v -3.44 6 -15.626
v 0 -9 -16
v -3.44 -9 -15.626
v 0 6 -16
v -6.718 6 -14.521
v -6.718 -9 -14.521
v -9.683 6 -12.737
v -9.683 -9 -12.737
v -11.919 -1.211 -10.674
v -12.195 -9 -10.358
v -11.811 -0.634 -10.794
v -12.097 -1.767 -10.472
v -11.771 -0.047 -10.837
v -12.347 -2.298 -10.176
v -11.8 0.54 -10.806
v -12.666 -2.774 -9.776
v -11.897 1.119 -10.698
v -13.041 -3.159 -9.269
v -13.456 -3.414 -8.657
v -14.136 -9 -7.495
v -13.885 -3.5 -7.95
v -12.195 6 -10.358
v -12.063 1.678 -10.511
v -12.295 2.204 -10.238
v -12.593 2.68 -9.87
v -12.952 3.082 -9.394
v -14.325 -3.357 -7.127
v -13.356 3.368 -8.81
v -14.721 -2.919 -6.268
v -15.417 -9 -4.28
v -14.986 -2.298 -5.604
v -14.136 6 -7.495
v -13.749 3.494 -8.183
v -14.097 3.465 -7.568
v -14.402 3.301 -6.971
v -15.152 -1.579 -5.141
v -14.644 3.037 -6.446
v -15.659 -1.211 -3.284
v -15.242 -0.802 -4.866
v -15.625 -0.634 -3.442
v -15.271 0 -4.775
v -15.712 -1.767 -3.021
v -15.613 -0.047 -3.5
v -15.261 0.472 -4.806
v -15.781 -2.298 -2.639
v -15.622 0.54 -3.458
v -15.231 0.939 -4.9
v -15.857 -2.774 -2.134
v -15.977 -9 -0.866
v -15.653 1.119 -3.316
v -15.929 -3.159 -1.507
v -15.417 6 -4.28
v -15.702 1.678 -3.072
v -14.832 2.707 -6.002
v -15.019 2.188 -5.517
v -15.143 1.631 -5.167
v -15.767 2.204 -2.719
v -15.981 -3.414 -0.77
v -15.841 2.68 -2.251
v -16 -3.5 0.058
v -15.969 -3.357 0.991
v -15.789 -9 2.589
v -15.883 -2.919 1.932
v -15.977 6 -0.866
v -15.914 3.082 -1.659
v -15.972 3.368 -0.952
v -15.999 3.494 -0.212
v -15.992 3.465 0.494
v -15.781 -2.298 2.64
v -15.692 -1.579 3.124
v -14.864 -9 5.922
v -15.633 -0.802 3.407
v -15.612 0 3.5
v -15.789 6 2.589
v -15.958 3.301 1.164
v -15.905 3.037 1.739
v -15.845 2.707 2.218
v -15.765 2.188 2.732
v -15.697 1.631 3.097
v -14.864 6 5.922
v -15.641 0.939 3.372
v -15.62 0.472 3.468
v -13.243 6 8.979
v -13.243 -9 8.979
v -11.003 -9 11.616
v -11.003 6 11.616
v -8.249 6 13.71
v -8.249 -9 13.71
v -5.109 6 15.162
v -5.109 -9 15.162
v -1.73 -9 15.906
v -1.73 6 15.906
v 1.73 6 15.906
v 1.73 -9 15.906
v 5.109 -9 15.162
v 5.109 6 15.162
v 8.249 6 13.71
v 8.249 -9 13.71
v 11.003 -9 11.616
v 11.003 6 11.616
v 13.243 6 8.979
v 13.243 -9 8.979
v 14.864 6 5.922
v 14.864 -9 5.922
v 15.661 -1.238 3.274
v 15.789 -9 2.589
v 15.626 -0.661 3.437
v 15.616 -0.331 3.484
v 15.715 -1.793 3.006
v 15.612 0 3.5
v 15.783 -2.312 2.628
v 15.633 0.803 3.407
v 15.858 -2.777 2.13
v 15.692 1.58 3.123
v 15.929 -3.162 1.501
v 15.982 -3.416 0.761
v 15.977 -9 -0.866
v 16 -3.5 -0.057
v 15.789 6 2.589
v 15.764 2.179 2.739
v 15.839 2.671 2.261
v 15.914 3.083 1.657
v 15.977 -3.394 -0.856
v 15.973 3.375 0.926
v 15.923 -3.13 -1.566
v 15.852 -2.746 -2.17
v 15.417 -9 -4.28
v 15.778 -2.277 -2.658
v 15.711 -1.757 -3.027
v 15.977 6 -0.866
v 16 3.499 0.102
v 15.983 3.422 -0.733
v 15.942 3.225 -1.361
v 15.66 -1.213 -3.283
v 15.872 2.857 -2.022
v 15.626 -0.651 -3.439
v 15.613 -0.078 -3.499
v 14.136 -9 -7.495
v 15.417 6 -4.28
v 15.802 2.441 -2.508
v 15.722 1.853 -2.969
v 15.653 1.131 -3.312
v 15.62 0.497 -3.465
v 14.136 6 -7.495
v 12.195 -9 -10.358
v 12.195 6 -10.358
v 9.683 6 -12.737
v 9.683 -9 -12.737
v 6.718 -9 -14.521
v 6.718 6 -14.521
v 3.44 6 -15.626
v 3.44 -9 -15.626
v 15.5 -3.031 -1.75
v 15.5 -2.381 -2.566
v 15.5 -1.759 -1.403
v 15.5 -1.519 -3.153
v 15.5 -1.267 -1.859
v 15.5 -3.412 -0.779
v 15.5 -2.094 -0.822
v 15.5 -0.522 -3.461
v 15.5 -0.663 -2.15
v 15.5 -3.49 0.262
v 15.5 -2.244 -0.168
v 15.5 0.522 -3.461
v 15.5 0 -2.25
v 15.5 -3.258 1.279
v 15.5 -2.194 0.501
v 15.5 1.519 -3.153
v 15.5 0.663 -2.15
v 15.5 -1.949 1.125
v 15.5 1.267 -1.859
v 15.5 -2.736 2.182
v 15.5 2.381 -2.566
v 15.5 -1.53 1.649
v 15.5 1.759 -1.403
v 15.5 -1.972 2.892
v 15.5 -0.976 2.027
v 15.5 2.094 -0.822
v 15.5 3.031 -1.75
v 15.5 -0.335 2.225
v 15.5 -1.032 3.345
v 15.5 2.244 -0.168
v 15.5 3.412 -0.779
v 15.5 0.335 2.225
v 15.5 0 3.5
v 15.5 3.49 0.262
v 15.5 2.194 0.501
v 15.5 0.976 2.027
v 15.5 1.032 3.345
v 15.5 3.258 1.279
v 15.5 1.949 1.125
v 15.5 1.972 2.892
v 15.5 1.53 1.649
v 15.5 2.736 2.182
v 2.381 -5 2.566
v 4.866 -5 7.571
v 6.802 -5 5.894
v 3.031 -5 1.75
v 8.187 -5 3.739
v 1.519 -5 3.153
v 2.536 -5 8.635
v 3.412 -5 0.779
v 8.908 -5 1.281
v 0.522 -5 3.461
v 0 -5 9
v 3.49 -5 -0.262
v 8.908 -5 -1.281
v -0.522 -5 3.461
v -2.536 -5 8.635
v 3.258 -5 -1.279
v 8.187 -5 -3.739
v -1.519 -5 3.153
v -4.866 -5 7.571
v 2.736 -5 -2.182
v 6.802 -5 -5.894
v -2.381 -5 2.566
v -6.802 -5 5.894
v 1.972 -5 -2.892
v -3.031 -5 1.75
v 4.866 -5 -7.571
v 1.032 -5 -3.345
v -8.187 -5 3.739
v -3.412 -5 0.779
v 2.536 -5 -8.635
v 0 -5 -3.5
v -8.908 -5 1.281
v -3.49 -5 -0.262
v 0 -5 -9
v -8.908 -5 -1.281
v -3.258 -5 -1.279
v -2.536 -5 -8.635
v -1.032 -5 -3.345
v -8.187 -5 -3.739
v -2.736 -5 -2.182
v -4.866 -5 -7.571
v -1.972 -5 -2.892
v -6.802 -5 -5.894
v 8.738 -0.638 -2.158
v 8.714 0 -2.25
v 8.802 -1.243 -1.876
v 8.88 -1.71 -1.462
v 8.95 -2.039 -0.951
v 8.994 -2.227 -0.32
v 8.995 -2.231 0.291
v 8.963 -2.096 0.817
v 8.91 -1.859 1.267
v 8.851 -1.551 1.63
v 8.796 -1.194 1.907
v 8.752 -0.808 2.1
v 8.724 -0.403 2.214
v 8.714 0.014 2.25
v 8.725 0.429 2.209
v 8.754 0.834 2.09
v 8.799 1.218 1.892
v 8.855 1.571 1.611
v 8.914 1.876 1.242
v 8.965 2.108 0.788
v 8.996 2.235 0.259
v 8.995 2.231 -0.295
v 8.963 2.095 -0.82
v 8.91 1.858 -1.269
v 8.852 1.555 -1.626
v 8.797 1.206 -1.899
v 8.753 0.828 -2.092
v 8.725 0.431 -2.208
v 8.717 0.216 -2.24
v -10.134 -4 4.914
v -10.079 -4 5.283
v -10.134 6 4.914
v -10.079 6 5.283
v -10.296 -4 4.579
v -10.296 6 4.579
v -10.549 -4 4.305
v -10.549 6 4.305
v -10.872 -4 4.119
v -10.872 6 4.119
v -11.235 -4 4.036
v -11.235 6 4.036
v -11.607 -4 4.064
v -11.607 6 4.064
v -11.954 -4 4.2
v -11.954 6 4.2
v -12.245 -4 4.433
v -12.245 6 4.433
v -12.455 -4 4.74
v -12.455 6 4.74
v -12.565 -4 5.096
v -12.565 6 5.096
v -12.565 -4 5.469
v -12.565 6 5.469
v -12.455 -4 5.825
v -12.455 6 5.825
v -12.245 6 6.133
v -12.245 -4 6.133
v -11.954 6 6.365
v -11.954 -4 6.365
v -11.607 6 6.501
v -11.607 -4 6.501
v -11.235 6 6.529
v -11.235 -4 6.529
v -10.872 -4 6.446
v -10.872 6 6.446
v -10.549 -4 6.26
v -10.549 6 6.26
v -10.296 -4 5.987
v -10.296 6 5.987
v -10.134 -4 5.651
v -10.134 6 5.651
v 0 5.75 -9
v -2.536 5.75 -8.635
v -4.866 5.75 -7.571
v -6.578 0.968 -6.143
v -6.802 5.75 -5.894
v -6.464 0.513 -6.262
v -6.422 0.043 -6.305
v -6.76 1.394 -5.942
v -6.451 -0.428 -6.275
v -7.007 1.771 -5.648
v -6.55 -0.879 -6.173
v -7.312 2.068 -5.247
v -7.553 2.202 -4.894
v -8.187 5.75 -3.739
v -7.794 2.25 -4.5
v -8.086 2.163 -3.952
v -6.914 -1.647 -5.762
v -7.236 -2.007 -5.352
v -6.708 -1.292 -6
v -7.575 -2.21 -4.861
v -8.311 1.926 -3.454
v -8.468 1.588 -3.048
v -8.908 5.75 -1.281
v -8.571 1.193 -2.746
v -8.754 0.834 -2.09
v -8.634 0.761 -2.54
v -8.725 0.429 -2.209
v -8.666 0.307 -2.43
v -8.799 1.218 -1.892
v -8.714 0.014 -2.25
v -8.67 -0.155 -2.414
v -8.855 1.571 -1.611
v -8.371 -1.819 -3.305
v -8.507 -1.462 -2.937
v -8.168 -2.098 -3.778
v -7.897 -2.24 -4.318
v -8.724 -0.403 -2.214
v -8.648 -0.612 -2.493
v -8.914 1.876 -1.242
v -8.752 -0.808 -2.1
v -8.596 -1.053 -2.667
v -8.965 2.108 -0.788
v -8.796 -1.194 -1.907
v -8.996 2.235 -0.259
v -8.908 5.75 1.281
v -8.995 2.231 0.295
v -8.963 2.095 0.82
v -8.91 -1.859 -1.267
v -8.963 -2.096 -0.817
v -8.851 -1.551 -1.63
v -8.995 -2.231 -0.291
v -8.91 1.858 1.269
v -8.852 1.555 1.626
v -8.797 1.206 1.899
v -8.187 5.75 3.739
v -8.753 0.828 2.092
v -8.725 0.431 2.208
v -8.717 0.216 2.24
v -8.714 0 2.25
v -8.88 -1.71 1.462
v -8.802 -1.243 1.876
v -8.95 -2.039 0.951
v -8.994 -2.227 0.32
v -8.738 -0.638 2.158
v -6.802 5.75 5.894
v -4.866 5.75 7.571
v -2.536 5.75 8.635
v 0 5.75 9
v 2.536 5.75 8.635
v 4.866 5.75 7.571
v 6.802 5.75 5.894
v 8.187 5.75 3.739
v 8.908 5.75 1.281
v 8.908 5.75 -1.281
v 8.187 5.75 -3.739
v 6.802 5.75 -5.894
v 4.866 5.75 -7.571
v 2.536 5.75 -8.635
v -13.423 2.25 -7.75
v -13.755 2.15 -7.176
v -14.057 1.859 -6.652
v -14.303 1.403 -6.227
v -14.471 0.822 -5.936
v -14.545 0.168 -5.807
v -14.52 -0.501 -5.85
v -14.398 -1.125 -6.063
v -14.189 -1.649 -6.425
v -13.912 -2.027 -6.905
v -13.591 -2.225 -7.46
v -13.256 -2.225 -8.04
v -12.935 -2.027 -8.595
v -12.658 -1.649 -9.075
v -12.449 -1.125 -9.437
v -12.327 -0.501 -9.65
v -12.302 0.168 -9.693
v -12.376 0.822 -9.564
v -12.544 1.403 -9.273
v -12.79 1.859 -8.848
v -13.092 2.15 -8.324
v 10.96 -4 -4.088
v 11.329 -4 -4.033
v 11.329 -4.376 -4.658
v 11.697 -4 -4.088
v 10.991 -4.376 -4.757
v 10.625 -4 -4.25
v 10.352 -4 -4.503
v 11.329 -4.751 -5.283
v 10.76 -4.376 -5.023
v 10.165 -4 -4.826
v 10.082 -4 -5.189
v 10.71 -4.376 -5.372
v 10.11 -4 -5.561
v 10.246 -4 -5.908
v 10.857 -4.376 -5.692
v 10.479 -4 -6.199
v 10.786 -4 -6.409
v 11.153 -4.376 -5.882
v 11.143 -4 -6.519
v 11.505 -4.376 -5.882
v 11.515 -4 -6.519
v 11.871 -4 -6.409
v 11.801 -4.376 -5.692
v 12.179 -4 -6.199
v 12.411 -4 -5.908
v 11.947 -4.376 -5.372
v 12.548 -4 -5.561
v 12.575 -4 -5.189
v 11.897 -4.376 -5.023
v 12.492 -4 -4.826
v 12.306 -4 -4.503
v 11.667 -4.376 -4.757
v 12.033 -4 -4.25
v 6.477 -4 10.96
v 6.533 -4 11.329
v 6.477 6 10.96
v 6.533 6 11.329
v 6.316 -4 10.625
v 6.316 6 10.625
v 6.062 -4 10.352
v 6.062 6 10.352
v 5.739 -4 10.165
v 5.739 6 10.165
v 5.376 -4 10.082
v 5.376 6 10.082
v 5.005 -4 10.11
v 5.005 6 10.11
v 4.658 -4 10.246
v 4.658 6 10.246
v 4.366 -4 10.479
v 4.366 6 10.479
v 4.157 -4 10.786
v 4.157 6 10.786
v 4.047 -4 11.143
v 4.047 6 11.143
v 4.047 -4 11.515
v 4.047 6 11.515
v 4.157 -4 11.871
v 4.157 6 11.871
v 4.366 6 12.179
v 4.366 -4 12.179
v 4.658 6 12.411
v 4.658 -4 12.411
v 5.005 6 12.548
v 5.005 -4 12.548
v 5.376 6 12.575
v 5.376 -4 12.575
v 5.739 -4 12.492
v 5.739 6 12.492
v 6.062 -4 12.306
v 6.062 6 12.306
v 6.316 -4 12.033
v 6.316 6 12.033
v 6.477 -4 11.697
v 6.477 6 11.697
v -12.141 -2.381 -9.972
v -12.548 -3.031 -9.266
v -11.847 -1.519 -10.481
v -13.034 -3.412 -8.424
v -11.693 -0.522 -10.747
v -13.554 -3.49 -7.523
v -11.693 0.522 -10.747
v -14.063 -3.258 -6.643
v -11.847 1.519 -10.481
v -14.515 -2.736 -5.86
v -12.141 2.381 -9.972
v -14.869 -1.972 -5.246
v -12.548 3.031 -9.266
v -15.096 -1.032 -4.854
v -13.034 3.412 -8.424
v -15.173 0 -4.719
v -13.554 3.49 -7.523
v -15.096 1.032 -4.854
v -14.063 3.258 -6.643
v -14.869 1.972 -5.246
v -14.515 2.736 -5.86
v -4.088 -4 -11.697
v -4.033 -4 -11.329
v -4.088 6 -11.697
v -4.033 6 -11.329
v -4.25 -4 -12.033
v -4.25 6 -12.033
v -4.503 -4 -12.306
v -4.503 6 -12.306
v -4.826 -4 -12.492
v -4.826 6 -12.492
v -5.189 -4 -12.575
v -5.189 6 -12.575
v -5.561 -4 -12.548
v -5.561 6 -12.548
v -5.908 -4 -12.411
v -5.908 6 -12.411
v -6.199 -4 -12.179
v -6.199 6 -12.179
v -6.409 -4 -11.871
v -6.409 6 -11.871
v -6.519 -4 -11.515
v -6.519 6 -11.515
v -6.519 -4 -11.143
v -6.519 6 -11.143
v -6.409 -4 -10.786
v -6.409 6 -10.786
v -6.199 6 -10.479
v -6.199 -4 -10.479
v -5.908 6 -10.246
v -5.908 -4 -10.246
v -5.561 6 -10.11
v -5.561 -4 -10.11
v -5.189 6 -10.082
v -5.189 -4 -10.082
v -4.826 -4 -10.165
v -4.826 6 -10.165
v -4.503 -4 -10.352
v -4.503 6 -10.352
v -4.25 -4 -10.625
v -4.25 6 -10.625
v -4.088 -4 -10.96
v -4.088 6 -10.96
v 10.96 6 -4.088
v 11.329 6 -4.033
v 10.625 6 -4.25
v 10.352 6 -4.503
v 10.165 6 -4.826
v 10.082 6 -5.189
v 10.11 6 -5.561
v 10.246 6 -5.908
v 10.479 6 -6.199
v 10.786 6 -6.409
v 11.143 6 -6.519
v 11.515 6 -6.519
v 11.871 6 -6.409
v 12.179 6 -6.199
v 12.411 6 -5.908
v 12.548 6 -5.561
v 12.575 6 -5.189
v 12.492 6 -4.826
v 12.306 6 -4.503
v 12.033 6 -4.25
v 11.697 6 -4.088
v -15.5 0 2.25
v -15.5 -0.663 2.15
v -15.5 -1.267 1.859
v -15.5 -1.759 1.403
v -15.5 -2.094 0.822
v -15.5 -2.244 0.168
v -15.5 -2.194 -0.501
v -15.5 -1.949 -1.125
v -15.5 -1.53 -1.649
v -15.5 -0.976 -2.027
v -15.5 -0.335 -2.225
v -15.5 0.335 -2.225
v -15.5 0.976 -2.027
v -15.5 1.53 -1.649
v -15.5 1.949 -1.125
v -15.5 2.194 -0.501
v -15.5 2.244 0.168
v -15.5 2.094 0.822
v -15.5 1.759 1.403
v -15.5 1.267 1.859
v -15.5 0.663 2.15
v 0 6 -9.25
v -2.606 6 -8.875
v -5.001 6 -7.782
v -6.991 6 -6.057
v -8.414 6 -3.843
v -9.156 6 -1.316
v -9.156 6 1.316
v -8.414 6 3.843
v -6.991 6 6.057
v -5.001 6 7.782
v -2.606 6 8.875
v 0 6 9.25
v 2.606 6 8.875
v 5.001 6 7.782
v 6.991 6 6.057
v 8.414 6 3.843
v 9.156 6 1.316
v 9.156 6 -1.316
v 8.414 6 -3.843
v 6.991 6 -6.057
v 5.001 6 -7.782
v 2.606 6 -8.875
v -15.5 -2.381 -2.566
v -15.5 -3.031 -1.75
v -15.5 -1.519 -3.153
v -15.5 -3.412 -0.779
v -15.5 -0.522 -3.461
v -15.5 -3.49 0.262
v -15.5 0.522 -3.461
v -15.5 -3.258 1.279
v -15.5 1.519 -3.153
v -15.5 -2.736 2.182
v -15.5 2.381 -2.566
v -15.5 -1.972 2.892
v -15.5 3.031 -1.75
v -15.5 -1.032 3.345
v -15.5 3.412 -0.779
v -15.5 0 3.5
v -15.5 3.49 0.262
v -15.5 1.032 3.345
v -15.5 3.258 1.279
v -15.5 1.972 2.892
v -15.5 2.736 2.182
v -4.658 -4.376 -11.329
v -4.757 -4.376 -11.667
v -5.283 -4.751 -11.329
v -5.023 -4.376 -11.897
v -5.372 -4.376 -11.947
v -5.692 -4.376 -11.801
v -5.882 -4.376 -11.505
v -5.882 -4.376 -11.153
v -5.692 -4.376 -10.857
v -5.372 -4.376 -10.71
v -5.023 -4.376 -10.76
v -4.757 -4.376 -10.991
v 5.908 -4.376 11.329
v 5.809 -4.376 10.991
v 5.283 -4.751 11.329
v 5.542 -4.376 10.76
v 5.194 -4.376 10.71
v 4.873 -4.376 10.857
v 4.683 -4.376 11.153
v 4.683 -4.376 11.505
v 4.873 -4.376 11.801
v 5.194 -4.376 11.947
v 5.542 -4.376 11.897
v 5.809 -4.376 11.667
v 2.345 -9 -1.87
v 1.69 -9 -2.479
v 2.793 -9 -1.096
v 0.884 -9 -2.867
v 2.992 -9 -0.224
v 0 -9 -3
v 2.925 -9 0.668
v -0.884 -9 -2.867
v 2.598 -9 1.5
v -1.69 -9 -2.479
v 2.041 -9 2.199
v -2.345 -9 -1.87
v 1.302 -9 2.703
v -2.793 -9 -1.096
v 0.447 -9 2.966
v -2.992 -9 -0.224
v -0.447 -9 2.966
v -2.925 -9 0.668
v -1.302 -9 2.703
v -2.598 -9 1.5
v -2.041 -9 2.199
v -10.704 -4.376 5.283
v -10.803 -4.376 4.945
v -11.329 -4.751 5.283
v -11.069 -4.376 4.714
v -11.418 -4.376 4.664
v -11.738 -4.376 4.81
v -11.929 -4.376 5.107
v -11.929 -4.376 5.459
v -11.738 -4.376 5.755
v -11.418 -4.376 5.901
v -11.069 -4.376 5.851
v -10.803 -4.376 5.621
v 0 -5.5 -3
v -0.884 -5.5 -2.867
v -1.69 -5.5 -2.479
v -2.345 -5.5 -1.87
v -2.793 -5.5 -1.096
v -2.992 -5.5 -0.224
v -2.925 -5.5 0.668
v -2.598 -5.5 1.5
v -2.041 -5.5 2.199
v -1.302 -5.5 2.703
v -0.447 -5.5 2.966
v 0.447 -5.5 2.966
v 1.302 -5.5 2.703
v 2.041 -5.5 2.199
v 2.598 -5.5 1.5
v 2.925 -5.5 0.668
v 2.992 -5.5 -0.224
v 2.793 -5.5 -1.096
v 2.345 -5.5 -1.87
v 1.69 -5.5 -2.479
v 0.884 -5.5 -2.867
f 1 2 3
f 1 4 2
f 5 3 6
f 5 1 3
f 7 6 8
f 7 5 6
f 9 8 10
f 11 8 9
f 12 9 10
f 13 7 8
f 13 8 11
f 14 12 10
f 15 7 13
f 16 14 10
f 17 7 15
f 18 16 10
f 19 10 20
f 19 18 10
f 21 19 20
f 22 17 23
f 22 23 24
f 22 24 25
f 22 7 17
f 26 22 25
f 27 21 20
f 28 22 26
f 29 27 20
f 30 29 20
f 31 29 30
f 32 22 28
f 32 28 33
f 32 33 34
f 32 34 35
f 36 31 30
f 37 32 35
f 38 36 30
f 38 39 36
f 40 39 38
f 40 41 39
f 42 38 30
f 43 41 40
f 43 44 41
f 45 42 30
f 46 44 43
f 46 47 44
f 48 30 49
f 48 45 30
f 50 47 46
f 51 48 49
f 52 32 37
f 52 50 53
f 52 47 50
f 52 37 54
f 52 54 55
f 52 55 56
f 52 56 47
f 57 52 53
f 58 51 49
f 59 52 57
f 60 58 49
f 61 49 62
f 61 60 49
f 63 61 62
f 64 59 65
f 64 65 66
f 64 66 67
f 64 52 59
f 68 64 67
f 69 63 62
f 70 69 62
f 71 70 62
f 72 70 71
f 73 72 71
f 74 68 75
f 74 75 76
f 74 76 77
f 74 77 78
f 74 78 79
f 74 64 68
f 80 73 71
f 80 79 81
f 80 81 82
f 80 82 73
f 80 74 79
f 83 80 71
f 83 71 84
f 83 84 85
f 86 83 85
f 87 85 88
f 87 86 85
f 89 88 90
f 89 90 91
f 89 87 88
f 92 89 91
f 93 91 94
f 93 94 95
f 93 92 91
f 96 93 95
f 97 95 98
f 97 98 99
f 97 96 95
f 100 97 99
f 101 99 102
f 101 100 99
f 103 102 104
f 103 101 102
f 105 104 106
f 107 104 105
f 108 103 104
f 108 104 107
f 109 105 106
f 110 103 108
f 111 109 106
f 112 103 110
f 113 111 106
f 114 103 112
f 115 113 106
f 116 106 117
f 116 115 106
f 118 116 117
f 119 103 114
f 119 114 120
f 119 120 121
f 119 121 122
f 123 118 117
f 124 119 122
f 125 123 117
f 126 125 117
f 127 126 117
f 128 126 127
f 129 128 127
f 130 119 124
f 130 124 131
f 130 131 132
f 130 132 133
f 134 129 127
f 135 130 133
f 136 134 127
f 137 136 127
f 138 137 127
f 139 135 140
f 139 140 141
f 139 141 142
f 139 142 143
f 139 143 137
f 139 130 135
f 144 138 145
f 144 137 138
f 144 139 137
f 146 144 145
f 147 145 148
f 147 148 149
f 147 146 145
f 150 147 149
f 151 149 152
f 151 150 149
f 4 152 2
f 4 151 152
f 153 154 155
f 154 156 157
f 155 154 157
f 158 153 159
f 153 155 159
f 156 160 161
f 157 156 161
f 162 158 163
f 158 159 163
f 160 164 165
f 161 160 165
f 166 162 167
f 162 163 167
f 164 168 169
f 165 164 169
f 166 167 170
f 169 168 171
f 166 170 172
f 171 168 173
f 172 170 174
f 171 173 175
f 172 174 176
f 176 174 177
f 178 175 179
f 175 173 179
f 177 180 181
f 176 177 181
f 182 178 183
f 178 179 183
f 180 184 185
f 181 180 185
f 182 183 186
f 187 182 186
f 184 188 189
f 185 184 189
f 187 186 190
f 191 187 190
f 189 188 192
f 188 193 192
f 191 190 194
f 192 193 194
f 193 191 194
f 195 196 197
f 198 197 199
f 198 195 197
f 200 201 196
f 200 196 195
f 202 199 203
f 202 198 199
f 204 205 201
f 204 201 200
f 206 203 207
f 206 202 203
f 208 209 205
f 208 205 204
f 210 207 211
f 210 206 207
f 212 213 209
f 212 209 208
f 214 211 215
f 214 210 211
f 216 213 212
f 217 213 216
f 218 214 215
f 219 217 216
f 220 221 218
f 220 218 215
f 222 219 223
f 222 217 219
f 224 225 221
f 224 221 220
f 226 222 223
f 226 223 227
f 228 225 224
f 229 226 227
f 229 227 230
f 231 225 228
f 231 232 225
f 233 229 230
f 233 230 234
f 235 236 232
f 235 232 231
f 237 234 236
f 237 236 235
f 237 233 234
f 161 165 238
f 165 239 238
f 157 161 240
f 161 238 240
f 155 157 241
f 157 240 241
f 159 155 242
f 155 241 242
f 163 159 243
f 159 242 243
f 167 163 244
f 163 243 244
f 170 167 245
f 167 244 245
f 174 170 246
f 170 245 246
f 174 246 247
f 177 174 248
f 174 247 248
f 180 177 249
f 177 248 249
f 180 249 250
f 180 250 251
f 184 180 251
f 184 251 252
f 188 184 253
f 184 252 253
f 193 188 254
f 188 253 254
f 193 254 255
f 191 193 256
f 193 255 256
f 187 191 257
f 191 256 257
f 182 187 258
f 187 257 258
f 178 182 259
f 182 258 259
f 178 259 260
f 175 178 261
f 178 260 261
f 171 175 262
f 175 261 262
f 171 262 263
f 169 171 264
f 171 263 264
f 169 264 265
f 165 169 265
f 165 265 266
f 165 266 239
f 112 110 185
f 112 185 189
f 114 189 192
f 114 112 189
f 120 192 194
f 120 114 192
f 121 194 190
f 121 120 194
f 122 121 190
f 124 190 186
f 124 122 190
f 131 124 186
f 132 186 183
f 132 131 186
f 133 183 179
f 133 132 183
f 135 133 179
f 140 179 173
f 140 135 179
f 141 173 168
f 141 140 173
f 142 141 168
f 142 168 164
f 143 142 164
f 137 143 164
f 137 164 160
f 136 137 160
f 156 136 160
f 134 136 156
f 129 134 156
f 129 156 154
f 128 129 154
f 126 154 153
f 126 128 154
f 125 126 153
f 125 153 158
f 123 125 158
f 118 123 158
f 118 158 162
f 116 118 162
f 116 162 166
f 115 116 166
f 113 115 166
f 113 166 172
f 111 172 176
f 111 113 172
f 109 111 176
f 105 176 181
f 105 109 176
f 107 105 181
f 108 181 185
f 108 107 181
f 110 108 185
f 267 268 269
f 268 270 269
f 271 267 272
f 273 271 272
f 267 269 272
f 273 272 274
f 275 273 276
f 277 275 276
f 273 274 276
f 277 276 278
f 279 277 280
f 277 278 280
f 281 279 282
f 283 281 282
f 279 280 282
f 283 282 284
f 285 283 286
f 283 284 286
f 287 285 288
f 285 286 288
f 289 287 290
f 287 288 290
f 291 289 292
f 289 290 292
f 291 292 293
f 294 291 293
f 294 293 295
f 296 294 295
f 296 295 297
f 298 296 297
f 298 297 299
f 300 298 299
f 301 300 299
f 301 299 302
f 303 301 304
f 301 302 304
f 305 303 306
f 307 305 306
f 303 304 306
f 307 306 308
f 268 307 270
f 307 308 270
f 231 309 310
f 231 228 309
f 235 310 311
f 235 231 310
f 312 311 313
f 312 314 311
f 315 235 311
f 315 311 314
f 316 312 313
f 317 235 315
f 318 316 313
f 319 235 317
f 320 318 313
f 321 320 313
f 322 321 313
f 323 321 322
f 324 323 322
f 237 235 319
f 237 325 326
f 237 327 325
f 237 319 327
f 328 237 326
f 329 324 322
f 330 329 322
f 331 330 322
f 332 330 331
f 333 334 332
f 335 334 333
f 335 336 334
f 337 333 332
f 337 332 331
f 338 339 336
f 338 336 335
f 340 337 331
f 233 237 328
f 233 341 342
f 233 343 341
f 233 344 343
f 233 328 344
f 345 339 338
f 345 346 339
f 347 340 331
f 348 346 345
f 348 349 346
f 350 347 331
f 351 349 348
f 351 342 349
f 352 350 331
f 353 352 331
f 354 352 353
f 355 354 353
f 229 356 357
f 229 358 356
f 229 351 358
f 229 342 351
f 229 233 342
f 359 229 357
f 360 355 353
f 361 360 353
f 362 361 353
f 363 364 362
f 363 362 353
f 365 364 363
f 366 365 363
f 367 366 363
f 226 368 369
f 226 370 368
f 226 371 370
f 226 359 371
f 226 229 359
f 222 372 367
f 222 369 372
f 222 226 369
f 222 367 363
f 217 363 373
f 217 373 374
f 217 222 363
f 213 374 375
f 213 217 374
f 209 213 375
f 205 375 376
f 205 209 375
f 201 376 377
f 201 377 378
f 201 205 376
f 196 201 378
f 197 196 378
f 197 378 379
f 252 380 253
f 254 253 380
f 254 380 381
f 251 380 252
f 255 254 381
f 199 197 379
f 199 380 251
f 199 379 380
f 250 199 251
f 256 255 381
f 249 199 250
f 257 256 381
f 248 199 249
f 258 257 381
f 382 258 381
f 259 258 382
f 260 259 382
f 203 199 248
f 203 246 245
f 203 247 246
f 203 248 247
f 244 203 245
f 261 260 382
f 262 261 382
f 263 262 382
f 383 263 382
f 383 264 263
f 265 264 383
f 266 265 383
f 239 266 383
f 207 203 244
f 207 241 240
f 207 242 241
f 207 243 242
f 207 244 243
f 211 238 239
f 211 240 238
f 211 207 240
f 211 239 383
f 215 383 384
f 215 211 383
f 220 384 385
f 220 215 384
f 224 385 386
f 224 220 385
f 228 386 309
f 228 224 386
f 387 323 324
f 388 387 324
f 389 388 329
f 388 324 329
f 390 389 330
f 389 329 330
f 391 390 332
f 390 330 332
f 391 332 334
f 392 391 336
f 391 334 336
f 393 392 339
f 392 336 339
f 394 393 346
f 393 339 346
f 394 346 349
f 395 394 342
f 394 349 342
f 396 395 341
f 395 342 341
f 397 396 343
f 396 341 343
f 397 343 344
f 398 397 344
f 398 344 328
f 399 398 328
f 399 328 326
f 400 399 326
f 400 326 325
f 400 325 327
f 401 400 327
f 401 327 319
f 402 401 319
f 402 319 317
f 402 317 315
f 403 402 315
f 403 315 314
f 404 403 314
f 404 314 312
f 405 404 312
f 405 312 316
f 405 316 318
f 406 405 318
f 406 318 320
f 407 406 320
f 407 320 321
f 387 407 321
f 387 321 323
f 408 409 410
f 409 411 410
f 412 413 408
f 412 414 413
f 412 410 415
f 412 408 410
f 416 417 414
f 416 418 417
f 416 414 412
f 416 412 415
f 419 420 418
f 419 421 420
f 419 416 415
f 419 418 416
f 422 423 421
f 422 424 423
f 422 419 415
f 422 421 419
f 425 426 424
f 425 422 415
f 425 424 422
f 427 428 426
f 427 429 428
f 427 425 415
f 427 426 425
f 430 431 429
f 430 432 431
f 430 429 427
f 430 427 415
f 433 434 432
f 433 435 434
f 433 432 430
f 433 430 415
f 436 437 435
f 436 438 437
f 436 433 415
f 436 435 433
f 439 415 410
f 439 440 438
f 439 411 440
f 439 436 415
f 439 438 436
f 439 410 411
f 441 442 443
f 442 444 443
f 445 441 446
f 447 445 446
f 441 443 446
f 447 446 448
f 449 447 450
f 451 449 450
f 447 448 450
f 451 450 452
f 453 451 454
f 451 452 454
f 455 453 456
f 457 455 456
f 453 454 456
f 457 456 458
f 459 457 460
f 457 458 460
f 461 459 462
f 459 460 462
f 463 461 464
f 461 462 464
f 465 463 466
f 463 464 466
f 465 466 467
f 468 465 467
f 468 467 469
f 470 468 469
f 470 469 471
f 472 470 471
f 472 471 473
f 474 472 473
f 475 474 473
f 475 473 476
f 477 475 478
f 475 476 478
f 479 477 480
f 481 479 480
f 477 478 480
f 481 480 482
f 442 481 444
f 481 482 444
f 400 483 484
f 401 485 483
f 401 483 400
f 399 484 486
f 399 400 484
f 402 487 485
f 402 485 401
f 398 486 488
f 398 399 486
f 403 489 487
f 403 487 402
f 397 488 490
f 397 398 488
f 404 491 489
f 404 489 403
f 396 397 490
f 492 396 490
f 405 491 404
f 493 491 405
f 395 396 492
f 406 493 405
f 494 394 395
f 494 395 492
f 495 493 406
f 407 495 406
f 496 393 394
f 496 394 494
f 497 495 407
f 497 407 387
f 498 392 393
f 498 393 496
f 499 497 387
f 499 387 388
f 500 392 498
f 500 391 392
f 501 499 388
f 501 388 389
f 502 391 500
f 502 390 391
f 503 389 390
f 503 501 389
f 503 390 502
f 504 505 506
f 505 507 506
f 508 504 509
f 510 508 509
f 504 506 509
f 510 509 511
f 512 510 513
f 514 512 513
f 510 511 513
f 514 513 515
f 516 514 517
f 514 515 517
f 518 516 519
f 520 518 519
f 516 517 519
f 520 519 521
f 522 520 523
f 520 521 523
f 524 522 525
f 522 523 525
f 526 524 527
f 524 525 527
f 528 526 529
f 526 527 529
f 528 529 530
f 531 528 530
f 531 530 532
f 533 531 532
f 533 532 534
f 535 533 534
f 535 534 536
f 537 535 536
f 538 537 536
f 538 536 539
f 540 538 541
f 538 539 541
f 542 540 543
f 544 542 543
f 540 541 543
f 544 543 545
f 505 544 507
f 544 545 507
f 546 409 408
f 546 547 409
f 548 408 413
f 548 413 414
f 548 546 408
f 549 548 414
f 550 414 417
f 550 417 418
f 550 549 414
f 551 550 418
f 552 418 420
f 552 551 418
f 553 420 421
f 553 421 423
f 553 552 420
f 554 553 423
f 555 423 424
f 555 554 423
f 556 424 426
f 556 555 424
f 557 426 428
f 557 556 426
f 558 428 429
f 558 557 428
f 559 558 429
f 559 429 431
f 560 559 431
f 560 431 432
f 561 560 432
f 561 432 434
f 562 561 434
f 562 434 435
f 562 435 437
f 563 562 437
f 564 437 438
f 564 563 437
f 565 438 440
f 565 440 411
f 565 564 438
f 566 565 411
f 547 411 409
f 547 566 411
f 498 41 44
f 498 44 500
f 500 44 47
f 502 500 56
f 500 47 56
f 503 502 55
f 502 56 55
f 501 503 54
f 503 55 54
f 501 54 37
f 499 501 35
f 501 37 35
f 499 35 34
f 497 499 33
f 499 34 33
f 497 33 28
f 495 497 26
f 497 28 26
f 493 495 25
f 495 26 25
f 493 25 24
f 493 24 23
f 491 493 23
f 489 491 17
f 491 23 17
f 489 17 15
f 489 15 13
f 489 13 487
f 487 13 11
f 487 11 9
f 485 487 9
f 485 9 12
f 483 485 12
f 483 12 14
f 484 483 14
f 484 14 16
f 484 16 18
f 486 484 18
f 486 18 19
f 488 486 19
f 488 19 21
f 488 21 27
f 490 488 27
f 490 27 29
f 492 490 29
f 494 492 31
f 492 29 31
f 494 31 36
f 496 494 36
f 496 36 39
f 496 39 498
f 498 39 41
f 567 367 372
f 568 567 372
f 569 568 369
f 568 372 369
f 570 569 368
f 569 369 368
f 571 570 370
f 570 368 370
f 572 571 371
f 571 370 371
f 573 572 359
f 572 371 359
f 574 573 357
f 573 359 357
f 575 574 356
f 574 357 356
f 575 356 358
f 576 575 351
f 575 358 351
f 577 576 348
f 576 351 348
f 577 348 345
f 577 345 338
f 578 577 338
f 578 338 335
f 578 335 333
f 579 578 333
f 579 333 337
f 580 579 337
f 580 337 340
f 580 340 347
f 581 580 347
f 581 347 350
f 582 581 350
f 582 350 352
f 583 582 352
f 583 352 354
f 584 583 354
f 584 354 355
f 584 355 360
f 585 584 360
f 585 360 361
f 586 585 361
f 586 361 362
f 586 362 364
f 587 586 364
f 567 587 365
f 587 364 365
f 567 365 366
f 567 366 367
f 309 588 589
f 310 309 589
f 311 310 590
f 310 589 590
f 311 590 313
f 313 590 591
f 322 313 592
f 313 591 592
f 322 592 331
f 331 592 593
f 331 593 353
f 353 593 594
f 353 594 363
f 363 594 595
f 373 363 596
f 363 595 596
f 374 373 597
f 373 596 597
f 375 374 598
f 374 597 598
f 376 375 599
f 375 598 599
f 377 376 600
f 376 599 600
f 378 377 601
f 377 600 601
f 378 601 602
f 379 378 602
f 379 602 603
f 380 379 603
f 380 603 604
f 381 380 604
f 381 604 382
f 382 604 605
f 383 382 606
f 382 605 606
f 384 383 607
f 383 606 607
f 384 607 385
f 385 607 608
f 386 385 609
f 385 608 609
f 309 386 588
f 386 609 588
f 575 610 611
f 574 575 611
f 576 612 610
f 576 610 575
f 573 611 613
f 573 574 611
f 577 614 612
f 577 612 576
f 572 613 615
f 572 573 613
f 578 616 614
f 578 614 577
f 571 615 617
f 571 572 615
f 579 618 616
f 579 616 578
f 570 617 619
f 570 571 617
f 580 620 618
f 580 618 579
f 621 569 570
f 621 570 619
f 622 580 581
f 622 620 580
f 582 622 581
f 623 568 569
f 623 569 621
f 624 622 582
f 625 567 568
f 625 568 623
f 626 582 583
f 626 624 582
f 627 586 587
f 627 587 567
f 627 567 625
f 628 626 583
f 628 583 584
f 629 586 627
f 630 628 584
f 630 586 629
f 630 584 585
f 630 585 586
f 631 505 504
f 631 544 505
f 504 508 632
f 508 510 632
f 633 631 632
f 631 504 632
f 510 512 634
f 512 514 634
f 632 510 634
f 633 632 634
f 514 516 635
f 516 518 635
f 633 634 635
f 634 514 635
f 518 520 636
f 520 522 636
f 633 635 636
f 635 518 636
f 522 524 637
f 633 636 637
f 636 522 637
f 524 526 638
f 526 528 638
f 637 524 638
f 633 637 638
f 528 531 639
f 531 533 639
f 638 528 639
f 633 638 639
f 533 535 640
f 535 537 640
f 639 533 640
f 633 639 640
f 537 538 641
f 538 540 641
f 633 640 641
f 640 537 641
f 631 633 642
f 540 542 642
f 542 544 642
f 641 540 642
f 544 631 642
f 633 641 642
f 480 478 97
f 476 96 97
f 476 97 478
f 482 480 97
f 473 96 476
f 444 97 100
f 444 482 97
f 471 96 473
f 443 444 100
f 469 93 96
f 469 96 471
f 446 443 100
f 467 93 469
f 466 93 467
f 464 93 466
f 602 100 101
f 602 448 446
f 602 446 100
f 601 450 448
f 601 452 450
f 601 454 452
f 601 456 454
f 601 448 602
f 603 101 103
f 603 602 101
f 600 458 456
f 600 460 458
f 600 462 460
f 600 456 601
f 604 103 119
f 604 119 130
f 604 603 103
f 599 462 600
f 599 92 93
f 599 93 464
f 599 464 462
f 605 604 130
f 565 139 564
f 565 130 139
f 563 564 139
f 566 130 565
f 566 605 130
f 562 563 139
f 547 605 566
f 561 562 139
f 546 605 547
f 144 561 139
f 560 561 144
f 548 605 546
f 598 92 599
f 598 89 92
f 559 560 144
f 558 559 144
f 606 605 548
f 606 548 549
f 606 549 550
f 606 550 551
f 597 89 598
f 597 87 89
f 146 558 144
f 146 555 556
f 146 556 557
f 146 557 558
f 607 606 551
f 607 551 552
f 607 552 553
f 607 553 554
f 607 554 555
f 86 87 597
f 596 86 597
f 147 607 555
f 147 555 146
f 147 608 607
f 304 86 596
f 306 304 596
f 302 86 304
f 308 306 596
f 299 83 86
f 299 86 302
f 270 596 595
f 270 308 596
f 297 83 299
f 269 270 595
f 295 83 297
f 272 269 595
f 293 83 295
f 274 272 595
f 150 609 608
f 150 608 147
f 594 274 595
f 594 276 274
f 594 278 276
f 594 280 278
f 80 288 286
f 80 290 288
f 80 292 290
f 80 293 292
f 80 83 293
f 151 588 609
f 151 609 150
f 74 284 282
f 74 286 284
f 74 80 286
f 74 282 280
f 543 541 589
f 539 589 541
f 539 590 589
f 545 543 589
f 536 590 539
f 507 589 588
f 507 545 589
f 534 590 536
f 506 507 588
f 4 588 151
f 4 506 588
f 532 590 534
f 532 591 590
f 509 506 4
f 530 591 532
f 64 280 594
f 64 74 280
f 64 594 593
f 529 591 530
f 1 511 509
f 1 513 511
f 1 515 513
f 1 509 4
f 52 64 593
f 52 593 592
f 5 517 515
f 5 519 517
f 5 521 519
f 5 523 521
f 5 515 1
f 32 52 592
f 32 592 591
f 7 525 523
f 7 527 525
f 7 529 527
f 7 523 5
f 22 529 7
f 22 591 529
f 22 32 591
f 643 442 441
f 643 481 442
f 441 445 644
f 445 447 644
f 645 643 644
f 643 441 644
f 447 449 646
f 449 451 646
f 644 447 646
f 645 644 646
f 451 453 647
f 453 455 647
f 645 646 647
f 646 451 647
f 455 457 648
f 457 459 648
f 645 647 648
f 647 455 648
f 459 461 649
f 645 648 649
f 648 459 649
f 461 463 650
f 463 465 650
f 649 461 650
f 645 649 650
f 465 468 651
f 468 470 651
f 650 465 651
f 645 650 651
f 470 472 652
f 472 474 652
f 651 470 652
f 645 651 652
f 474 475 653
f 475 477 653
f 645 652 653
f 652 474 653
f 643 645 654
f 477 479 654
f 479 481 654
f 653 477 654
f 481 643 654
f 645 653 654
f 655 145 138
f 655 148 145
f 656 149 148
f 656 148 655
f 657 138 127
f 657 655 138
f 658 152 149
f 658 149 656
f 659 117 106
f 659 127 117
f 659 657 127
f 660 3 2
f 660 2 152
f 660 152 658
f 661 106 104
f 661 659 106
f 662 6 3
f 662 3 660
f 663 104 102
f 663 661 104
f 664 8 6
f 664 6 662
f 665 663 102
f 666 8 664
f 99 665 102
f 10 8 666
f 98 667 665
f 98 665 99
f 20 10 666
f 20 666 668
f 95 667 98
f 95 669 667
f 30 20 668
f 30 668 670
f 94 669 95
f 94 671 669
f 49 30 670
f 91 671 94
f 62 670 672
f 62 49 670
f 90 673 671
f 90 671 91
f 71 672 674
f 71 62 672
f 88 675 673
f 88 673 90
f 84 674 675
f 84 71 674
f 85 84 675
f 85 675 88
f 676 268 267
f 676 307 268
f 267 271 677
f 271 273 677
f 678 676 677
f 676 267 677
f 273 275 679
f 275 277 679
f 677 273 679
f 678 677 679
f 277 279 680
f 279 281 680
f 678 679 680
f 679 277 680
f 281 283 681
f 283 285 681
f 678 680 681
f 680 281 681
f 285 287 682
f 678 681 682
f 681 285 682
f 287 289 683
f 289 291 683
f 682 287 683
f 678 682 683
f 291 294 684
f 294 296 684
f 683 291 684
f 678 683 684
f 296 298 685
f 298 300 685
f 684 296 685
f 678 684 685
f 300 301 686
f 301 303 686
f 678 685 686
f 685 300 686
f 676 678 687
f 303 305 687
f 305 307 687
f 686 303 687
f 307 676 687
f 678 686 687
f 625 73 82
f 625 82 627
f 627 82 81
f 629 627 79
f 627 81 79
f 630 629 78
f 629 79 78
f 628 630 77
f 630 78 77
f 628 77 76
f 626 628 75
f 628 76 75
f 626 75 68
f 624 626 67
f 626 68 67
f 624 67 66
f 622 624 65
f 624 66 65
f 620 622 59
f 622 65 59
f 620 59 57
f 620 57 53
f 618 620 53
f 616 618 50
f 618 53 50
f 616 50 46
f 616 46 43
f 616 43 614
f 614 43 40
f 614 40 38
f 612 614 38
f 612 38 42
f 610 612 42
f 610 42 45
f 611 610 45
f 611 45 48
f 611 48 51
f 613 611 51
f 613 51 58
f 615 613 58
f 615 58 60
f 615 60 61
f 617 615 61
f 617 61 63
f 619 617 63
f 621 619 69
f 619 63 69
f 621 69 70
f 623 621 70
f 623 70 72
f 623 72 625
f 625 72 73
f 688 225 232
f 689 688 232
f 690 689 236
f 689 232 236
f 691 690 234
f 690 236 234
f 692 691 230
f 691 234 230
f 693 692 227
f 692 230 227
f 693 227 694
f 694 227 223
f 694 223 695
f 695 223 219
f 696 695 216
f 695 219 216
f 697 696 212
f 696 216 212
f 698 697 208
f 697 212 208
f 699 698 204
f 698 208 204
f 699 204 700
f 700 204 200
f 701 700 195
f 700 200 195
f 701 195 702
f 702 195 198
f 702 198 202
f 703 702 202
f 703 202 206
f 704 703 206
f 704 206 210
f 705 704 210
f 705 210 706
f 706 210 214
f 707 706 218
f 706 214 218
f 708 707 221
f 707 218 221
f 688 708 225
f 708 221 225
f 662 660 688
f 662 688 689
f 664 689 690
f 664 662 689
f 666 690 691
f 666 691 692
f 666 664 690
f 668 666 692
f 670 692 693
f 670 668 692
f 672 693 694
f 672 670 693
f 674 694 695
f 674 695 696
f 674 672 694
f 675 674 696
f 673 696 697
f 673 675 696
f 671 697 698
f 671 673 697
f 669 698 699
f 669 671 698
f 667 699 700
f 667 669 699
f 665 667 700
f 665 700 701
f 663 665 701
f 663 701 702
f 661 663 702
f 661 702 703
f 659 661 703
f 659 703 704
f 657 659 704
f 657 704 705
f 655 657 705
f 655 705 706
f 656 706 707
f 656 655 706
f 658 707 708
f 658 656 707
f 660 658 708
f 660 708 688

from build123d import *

# Parameters (mm, degrees)
ESBO_O4_W                        = 2.25
ESBO_O4_H                        = 16
F_4_5_4_5_DIAMETER_HOLE2_D       = 4.5
F_4_5_4_5_DIAMETER_HOLE2_DEPTH   = 18
F_4_5_4_5_DIAMETER_HOLE2_TIP     = 1.351936393
ESBO_O12_R                       = 16
ESBO_O12_R_2                     = 9
RESSALTO_EXTRUS_O1_DEPTH         = 1
CHANFRO1_SIZE                    = 0.5
CHANFRO2_SIZE                    = 0.25
FURO_DE_DI_METRO_4_5_4_5_2_D     = 4.5
FURO_DE_DI_METRO_4_5_4_5_2_DEPTH = 8
FURO_DE_DI_METRO_4_5_4_5_2_TIP   = 1.351936393
ESBO_O18_R                       = 3.5
CORTE_EXTRUS_O4_DEPTH            = 0.5
ESBO_O20_R                       = 3.5
CORTE_EXTRUS_O5_DEPTH            = 0.5


# Read off the part's stored shape, not the designer's step: PadrãoCircular5
with BuildPart() as part:
    # Esboço1 → Revolução1 (revolve)
    with BuildSketch(Plane.XY, mode=Mode.PRIVATE) as revolu_o1_sk:
        Polygon((3, -9), (16, -9), (16, 5), (9, 5), (9, -5), (3, -5), align=None)
    revolve(revolu_o1_sk.sketch.rotate(Axis((0, -9, 0), (0, 1, 0)), 90), axis=Axis((0, -9, 0), (0, 1, 0)))

    # Esboço4 → Furo de diâmetro Ø4.5 (4.5)1 (revolve, cut)
    with BuildSketch(Plane(origin=(16, 0, 0), x_dir=(0, 0, -1), z_dir=(0, 1, 0))):
        with Locations((1.125, 8)):
            Rectangle(ESBO_O4_W, ESBO_O4_H)
    revolve(axis=Axis((22.35, 0, 0), (-1, 0, 0)), mode=Mode.SUBTRACT)

    # Ø4.5 (4.5) Diameter Hole2
    with Locations(Plane(origin=(-13.856406461, 0, -8), x_dir=(0, -1, 0), z_dir=(-0.8660254037844364, 0, -0.5000000000000041))):
        with Locations((0, 0)):
            Hole(F_4_5_4_5_DIAMETER_HOLE2_D / 2, depth=F_4_5_4_5_DIAMETER_HOLE2_DEPTH)
            with Locations((0, 0, -(F_4_5_4_5_DIAMETER_HOLE2_DEPTH + F_4_5_4_5_DIAMETER_HOLE2_TIP / 2))):  # 118° drill point
                Cone(0, F_4_5_4_5_DIAMETER_HOLE2_D / 2, F_4_5_4_5_DIAMETER_HOLE2_TIP, mode=Mode.SUBTRACT)

    # Esboço12 → Ressalto-extrusão1 (add)
    with BuildSketch(Plane(origin=(0, 5, 0), x_dir=(1, 0, 0), z_dir=(0, 1, 0))):
        with Locations(Location((0, 0, 0), (0, 0, 90))):
            Circle(ESBO_O12_R)
        with Locations(Location((0, 0, 0), (0, 0, 90))):
            Circle(ESBO_O12_R_2, mode=Mode.SUBTRACT)
    extrude(amount=RESSALTO_EXTRUS_O1_DEPTH)

    # Esboço13 → Furo roscado de M3x0.51 (revolve, cut)
    with BuildSketch(Plane(origin=(11.328847338, 6, -5.282728272), x_dir=(0, 0, 1), z_dir=(1, 0, 0))):
        Polygon((0, 0), (0, 10.751075774), (1.25, 10), (1.25, 0), align=None)
    revolve(axis=Axis((11.328847338, 12.35, -5.282728272), (0, -1, 0)), mode=Mode.SUBTRACT)

    # PadrãoCircular5 outline → PadrãoCircular5 (revolve, cut)
    with BuildSketch(Plane(origin=(5.282728272, 0, 11.328847338), x_dir=(1, 0, 0), z_dir=(0, 0, 1))):
        Polygon((0, 6), (0, -4.751075774), (1.25, -4), (1.25, 6), align=None)
    revolve(axis=Axis((5.282728272, 0, 11.328847338), (0, 1, 0)), mode=Mode.SUBTRACT)

    # Padr_oCircular5 2 outline → Padr_oCircular5 2 (revolve, cut)
    with BuildSketch(Plane(origin=(-11.328847338, 0, 5.282728272), x_dir=(1, 0, 0), z_dir=(0, 0, 1))):
        Polygon((0, 6), (0, -4.751075774), (1.25, -4), (1.25, 6), align=None)
    revolve(axis=Axis((-11.328847338, 0, 5.282728272), (0, 1, 0)), mode=Mode.SUBTRACT)

    # Padr_oCircular5 3 outline → Padr_oCircular5 3 (revolve, cut)
    with BuildSketch(Plane(origin=(-5.282728272, 0, -11.328847338), x_dir=(1, 0, 0), z_dir=(0, 0, 1))):
        Polygon((0, 6), (0, -4.751075774), (1.25, -4), (1.25, 6), align=None)
    revolve(axis=Axis((-5.282728272, 0, -11.328847338), (0, 1, 0)), mode=Mode.SUBTRACT)

    # Chanfro1
    chanfro1_edges = [part.edges().sort_by_distance(p)[0] for p in [
        (0, -5, 3),
    ]]
    chamfer(chanfro1_edges, length=CHANFRO1_SIZE)

    # Chanfro2
    chanfro2_edges = [part.edges().sort_by_distance(p)[0] for p in [
        (0, 6, 9),
    ]]
    chamfer(chanfro2_edges, length=CHANFRO2_SIZE)

    # Furo de diâmetro Ø4.5 (4.5)2
    with Locations(Plane(origin=(-16, 0, 0), x_dir=(0, 0, -1), z_dir=(-1, 0, 0))):
        with Locations((0, 0)):
            Hole(FURO_DE_DI_METRO_4_5_4_5_2_D / 2, depth=FURO_DE_DI_METRO_4_5_4_5_2_DEPTH)
            with Locations((0, 0, -(FURO_DE_DI_METRO_4_5_4_5_2_DEPTH + FURO_DE_DI_METRO_4_5_4_5_2_TIP / 2))):  # 118° drill point
                Cone(0, FURO_DE_DI_METRO_4_5_4_5_2_D / 2, FURO_DE_DI_METRO_4_5_4_5_2_TIP, mode=Mode.SUBTRACT)

    # Esboço18 → Corte-extrusão4 (cut)
    with BuildSketch(Plane(origin=(-16, 0, 0), x_dir=(0, -1, 0), z_dir=(-1, 0, 0))):
        with Locations(Location((0, 0, 0), (0, 0, 90))):
            Circle(ESBO_O18_R)
    corte_extrus_o4 = extrude(amount=-CORTE_EXTRUS_O4_DEPTH, mode=Mode.SUBTRACT)

    # Esboço20 → Corte-extrusão5 (cut)
    with BuildSketch(Plane(origin=(-13.856406461, 0, -8), x_dir=(0, -1, 0), z_dir=(-0.8660254037844364, 0, -0.5000000000000041))):
        with Locations(Location((0, 0, 0), (0, 0, 90))):
            Circle(ESBO_O20_R)
    extrude(amount=-CORTE_EXTRUS_O5_DEPTH, mode=Mode.SUBTRACT)

    # Espelhar1: Corte-extrusão4 across plane
    add(corte_extrus_o4.mirror(Plane(origin=(0, 0, 0), x_dir=(0, 0, 1), z_dir=(1, 0, 0))), mode=Mode.SUBTRACT)


solid = part.part
